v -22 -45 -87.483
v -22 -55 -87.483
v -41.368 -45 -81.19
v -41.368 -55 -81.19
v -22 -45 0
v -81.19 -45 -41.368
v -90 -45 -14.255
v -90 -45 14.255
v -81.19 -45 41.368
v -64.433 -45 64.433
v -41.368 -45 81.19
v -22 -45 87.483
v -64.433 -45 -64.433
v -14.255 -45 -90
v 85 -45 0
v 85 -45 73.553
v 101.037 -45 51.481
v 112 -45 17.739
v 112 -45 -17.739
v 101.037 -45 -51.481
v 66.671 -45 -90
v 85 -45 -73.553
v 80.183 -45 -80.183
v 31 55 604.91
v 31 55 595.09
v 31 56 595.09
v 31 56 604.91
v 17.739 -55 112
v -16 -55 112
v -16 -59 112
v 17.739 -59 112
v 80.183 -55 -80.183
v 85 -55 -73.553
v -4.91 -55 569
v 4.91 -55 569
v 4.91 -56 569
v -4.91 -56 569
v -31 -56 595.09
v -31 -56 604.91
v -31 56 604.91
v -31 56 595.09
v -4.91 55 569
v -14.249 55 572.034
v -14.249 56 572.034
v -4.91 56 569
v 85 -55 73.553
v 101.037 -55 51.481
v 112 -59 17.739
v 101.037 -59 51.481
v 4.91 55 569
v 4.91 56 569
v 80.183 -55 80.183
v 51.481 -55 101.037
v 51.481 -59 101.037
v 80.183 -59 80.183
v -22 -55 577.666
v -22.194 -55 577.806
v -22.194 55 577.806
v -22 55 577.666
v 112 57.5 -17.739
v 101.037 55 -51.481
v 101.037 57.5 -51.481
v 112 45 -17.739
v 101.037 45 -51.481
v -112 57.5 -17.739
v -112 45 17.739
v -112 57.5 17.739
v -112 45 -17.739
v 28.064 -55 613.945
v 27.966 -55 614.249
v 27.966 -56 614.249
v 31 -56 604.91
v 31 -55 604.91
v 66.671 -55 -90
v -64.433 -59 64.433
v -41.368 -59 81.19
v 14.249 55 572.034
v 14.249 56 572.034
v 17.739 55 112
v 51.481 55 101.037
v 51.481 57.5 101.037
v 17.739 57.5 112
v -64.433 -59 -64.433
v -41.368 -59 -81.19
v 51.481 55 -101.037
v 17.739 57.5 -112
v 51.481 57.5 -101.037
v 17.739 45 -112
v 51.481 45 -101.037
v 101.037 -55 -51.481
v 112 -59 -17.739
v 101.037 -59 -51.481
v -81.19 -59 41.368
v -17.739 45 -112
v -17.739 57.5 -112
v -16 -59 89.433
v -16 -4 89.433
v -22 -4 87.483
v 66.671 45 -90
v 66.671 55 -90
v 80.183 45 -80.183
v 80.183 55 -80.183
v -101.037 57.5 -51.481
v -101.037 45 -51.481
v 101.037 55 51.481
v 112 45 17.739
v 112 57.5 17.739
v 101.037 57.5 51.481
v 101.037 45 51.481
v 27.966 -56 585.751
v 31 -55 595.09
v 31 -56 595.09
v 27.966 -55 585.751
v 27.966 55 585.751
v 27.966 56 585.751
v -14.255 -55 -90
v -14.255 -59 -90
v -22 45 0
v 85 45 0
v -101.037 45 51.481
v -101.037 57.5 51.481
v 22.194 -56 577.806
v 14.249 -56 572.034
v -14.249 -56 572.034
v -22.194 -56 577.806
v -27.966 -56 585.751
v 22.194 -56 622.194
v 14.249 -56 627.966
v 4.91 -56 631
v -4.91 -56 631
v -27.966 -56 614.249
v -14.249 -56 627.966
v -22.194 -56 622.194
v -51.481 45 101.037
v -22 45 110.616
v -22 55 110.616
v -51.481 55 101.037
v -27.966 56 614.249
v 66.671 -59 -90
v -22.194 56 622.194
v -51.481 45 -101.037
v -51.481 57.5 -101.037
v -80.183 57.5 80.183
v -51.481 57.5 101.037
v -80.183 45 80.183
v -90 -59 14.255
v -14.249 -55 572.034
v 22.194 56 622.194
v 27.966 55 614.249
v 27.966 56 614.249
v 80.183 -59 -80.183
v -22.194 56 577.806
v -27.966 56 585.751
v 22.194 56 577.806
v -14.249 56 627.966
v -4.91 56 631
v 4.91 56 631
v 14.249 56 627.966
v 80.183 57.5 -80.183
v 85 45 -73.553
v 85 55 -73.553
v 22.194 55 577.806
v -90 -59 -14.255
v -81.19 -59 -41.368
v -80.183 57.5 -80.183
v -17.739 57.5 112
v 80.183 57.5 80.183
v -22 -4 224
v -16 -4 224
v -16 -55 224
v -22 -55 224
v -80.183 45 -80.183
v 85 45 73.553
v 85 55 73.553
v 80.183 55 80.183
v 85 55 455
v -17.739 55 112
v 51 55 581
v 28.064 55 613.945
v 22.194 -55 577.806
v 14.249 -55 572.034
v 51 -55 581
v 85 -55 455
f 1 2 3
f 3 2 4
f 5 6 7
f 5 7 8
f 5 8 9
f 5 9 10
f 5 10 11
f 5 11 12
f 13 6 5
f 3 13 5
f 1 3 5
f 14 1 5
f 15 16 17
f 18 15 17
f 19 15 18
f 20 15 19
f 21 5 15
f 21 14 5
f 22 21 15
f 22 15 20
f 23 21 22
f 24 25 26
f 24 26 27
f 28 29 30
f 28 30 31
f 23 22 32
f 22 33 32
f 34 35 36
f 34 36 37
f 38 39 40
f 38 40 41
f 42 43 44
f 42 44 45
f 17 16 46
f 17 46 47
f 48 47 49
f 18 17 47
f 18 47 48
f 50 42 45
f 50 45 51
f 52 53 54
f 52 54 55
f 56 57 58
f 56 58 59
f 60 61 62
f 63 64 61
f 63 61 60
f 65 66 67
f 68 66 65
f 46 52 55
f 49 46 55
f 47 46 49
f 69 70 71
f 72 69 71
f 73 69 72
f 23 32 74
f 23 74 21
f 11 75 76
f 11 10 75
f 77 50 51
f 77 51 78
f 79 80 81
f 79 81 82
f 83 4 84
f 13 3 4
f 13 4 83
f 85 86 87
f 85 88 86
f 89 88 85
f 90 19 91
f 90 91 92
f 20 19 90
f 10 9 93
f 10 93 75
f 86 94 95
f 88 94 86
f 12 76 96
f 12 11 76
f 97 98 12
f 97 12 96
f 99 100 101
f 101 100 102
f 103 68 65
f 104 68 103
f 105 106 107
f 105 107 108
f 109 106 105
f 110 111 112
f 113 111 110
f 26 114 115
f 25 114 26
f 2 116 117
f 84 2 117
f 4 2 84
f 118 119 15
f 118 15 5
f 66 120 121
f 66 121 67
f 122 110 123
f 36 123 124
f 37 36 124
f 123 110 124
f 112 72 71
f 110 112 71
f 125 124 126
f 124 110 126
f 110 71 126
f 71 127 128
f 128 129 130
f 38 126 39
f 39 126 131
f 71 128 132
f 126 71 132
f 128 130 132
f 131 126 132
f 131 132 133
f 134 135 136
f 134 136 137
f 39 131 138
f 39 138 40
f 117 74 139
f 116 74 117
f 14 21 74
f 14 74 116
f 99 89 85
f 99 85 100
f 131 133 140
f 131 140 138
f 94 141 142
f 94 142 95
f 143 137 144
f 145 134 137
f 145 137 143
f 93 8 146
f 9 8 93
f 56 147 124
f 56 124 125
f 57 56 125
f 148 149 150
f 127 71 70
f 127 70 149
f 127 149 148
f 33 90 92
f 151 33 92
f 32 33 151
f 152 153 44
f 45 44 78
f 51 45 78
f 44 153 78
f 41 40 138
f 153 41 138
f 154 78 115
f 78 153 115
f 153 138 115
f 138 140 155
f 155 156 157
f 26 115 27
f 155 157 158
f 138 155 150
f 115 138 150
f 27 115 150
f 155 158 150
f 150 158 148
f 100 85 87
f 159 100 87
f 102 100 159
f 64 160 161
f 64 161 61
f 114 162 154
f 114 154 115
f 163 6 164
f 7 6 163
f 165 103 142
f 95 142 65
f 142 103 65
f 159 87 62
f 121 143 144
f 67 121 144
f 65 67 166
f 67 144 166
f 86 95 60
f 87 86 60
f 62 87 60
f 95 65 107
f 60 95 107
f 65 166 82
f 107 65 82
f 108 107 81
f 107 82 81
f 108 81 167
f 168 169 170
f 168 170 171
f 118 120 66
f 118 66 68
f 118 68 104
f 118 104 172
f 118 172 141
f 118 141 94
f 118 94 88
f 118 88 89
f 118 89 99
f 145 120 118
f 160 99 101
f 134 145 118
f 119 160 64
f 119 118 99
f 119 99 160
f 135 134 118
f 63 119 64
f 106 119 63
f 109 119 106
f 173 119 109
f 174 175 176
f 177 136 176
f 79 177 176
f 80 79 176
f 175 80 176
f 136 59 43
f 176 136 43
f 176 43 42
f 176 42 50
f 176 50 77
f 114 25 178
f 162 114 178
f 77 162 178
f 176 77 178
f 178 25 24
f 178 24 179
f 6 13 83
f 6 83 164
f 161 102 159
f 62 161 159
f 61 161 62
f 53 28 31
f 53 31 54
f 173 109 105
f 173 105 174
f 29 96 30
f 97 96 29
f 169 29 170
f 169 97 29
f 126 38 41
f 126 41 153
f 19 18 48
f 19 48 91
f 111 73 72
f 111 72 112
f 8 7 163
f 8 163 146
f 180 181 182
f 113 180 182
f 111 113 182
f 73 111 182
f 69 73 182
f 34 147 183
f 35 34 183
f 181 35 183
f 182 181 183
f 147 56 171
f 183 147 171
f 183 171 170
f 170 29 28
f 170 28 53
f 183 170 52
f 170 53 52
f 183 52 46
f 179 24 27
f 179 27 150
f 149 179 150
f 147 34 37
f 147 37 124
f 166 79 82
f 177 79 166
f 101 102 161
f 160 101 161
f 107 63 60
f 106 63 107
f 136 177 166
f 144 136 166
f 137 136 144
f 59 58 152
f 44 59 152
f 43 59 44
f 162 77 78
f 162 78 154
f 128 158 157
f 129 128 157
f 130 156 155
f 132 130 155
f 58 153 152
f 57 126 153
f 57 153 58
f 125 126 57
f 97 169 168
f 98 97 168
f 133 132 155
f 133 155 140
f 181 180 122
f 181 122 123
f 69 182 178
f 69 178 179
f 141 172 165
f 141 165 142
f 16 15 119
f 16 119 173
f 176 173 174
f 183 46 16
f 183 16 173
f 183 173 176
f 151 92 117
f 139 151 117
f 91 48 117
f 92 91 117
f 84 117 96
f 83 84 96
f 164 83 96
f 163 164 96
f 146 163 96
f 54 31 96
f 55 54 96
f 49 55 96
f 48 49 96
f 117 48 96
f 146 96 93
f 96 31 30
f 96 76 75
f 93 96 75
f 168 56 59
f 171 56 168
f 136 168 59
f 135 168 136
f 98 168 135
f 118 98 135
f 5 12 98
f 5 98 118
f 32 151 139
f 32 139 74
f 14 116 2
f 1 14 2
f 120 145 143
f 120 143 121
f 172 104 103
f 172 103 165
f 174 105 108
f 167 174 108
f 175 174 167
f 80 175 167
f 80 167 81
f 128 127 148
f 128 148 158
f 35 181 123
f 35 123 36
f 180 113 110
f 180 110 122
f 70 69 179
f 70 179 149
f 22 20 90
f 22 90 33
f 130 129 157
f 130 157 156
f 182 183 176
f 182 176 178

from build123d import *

# Parameters (mm, degrees)
BOSS_EXTRUDE1_DEPTH = 10
BOSS_EXTRUDE2_DEPTH = 90
BOSS_EXTRUDE3_DEPTH = 10
CUT_EXTRUDE1_DEPTH  = 10
CUT_EXTRUDE2_DEPTH  = 90
CUT_EXTRUDE3_DEPTH  = 10
CUT_EXTRUDE4_DEPTH  = 10
CUT_EXTRUDE5_DEPTH  = 10
CUT_EXTRUDE6_DEPTH  = 9.81685291
SKETCH10_W          = 107
SKETCH10_H          = 90
CUT_EXTRUDE7_DEPTH  = 80.18314709
SKETCH11_W          = 6
SKETCH11_H          = 51
CUT_EXTRUDE8_DEPTH  = 134.567114958
BOSS_EXTRUDE4_DEPTH = 4
BOSS_EXTRUDE5_DEPTH = 1
BOSS_EXTRUDE6_DEPTH = 1
BOSS_EXTRUDE7_DEPTH = 2.5
DRAFT1_ANGLE        = 18
CHAMFER1_SIZE       = 6.379377731
CHAMFER1_SIZE2      = 12.134297522


with BuildPart() as part:
    # Sketch1 → Boss-Extrude1 (new body)
    with BuildSketch(Plane(origin=(0, -45, 0), x_dir=(1, 0, 0), z_dir=(0, 1, 0))):
        Polygon((101.03665965, 51.480749424), (85, 73.553317831), (85, 90), (66.671408228, 90), (51.480749424, 101.03665965), (17.739057316, 112), (-17.739057316, 112), (-51.480749424, 101.03665965), (-80.18314709, 80.18314709), (-101.03665965, 51.480749424), (-112, 17.739057316), (-112, -17.739057316), (-101.03665965, -51.480749424), (-80.18314709, -80.18314709), (-51.480749424, -101.03665965), (-22, -110.615535798), (-22, -577.665828314), (-22.193549641, -577.806450359), (-27.96550401, -585.750863999), (-31, -595.09008235), (-31, -604.90991765), (-27.96550401, -614.249136001), (-22.193549641, -622.193549641), (-14.249136001, -627.96550401), (-4.90991765, -631), (4.90991765, -631), (14.249136001, -627.96550401), (22.193549641, -622.193549641), (27.96550401, -614.249136001), (28.064334249, -613.944967802), (51, -581), (85, -455), (85, -73.553317831), (101.03665965, -51.480749424), (112, -17.739057316), (112, 17.739057316), align=None)
    extrude(amount=-BOSS_EXTRUDE1_DEPTH)

    # Sketch2 → Boss-Extrude2 (add)
    with BuildSketch(Plane(origin=(0, -45, 0), x_dir=(-1, 0, 0), z_dir=(0, 1, 0))):
        Polygon((-85, -90), (-85, 455), (-51, 581), (-28.064334249, 613.944967802), (-27.96550401, 614.249136001), (-22.193549641, 622.193549641), (-14.249136001, 627.96550401), (-4.90991765, 631), (4.90991765, 631), (14.249136001, 627.96550401), (22.193549641, 622.193549641), (27.96550401, 614.249136001), (31, 604.90991765), (31, 595.09008235), (27.96550401, 585.750863999), (22.193549641, 577.806450359), (22, 577.665828314), (22, 110.615535798), (51.480749424, 101.03665965), (80.18314709, 80.18314709), (101.03665965, 51.480749424), (112, 17.739057316), (112, -17.739057316), (101.03665965, -51.480749424), (80.18314709, -80.18314709), (51.480749424, -101.03665965), (17.739057316, -112), (-17.739057316, -112), (-51.480749424, -101.03665965), (-66.671408228, -90), align=None)
    extrude(amount=BOSS_EXTRUDE2_DEPTH)

    # Sketch3 → Boss-Extrude3 (add)
    with BuildSketch(Plane(origin=(0, 45, 0), x_dir=(-1, 0, 0), z_dir=(0, 1, 0))):
        Polygon((-85, -73.553317831), (-101.03665965, -51.480749424), (-112, -17.739057316), (-112, 17.739057316), (-101.03665965, 51.480749424), (-85, 73.553317831), (-85, 455), (-51, 581), (-28.064334249, 613.944967802), (-27.96550401, 614.249136001), (-22.193549641, 622.193549641), (-14.249136001, 627.96550401), (-4.90991765, 631), (4.90991765, 631), (14.249136001, 627.96550401), (22.193549641, 622.193549641), (27.96550401, 614.249136001), (31, 604.90991765), (31, 595.09008235), (27.96550401, 585.750863999), (22.193549641, 577.806450359), (22, 577.665828314), (22, 110.615535798), (51.480749424, 101.03665965), (80.18314709, 80.18314709), (101.03665965, 51.480749424), (112, 17.739057316), (112, -17.739057316), (101.03665965, -51.480749424), (80.18314709, -80.18314709), (51.480749424, -101.03665965), (17.739057316, -112), (-17.739057316, -112), (-51.480749424, -101.03665965), (-66.671408228, -90), (-85, -90), align=None)
    extrude(amount=BOSS_EXTRUDE3_DEPTH)

    # Sketch4 → Cut-Extrude1 (cut)
    with BuildSketch(Plane.XZ.offset(55)):
        Polygon((-30.023339436, 89.432885042), (-22, 89.432885042), (-22, 110.615535798), (-51.480749424, 101.03665965), (-80.18314709, 80.18314709), (-101.03665965, 51.480749424), (-112, 17.739057316), (-112, -17.739057316), (-101.03665965, -51.480749424), (-80.18314709, -80.18314709), (-51.480749424, -101.03665965), (-17.739057316, -112), (17.739057316, -112), (51.480749424, -101.03665965), (66.671408228, -90), (-22, -90), (-22, -87.483366864), (-41.368459358, -81.190172933), (-64.432886054, -64.432886054), (-81.190172933, -41.368459358), (-90, -14.254599629), (-90, 14.254599629), (-81.190172933, 41.368459358), (-64.432886054, 64.432886054), align=None)
    extrude(amount=-CUT_EXTRUDE1_DEPTH, mode=Mode.SUBTRACT)

    # Sketch5 → Cut-Extrude2 (cut)
    with BuildSketch(Plane.XZ.offset(45)):
        Polygon((66.671408228, -90), (-22, -90), (-22, 110.615535798), (-51.480749424, 101.03665965), (-80.18314709, 80.18314709), (-101.03665965, 51.480749424), (-112, 17.739057316), (-112, -17.739057316), (-101.03665965, -51.480749424), (-80.18314709, -80.18314709), (-51.480749424, -101.03665965), (-17.739057316, -112), (17.739057316, -112), (51.480749424, -101.03665965), align=None)
    extrude(amount=-CUT_EXTRUDE2_DEPTH, mode=Mode.SUBTRACT)

    # Sketch6 → Cut-Extrude3 (cut)
    with BuildSketch(Plane.XZ.offset(55)):
        Polygon((85, -90), (85, -73.553317831), (73.050785959, -90), align=None)
    extrude(amount=-CUT_EXTRUDE3_DEPTH, mode=Mode.SUBTRACT)

    # Sketch7 → Cut-Extrude4 (cut)
    with BuildSketch(Plane.XZ.offset(55)):
        Polygon((-14.254599629, -90), (-22, -87.483366864), (-22, -90), align=None)
    extrude(amount=-CUT_EXTRUDE4_DEPTH, mode=Mode.SUBTRACT)

    # Sketch8 → Cut-Extrude5 (cut)
    with BuildSketch(Plane(origin=(0, 55, 0), x_dir=(-1, 0, 0), z_dir=(0, 1, 0))):
        Polygon((-80.18314709, -80.18314709), (-85, -73.553317831), (-85, -90), (-66.671408228, -90), align=None)
    extrude(amount=-CUT_EXTRUDE5_DEPTH, mode=Mode.SUBTRACT)

    # Sketch9 → Cut-Extrude6 (cut)
    with BuildSketch(Plane(origin=(0, 0, -90), x_dir=(-1, 0, 0), z_dir=(0, 0, -1))):
        Polygon((-80.18314709, -45), (22, -45), (22, 45), (-80.18314709, 45), (-85, 45), (-85, -45), align=None)
    extrude(amount=-CUT_EXTRUDE6_DEPTH, mode=Mode.SUBTRACT)

    # Sketch10 → Cut-Extrude7 (cut)
    with BuildSketch(Plane(origin=(0, 0, -80.18314709), x_dir=(-1, 0, 0), z_dir=(0, 0, -1))):
        with Locations((-31.5, 0)):
            Rectangle(SKETCH10_W, SKETCH10_H)
    extrude(amount=-CUT_EXTRUDE7_DEPTH, mode=Mode.SUBTRACT)

    # Sketch11 → Cut-Extrude8 (cut)
    with BuildSketch(Plane(origin=(0, 0, 89.432885042), x_dir=(-1, 0, 0), z_dir=(0, 0, -1))):
        with Locations((19, -29.5)):
            Rectangle(SKETCH11_W, SKETCH11_H)
    extrude(amount=-CUT_EXTRUDE8_DEPTH, mode=Mode.SUBTRACT)

    # Sketch12 → Boss-Extrude4 (add)
    with BuildSketch(Plane.XZ.offset(55)):
        Polygon((-16, 89.432885042), (-16, 112), (17.739057316, 112), (51.480749424, 101.03665965), (80.18314709, 80.18314709), (101.03665965, 51.480749424), (112, 17.739057316), (112, -17.739057316), (101.03665965, -51.480749424), (73.050785959, -90), (-14.254599629, -90), (-41.368459358, -81.190172933), (-64.432886054, -64.432886054), (-81.190172933, -41.368459358), (-90, -14.254599629), (-90, 14.254599629), (-81.190172933, 41.368459358), (-64.432886054, 64.432886054), (-30.023339436, 89.432885042), align=None)
    extrude(amount=BOSS_EXTRUDE4_DEPTH)

    # Sketch13 → Boss-Extrude5 (add)
    with BuildSketch(Plane.XZ.offset(55)):
        Polygon((22.193549641, 577.806450359), (14.249136001, 572.03449599), (4.90991765, 569), (-4.90991765, 569), (-14.249136001, 572.03449599), (-22.193549641, 577.806450359), (-27.96550401, 585.750863999), (-31, 595.09008235), (-31, 604.90991765), (-27.96550401, 614.249136001), (-22.193549641, 622.193549641), (-14.249136001, 627.96550401), (-4.90991765, 631), (4.90991765, 631), (14.249136001, 627.96550401), (22.193549641, 622.193549641), (27.96550401, 614.249136001), (31, 604.90991765), (31, 595.09008235), (27.96550401, 585.750863999), align=None)
    extrude(amount=BOSS_EXTRUDE5_DEPTH)

    # Sketch14 → Boss-Extrude6 (add)
    with BuildSketch(Plane(origin=(0, 55, 0), x_dir=(-1, 0, 0), z_dir=(0, 1, 0))):
        Polygon((-14.249136001, 572.03449599), (-22.193549641, 577.806450359), (-27.96550401, 585.750863999), (-31, 595.09008235), (-31, 604.90991765), (-27.96550401, 614.249136001), (-22.193549641, 622.193549641), (-14.249136001, 627.96550401), (-4.90991765, 631), (4.90991765, 631), (14.249136001, 627.96550401), (22.193549641, 622.193549641), (27.96550401, 614.249136001), (31, 604.90991765), (31, 595.09008235), (27.96550401, 585.750863999), (22.193549641, 577.806450359), (14.249136001, 572.03449599), (4.90991765, 569), (-4.90991765, 569), align=None)
    extrude(amount=BOSS_EXTRUDE6_DEPTH)

    # Sketch15 → Boss-Extrude7 (add)
    with BuildSketch(Plane(origin=(0, 55, 0), x_dir=(-1, 0, 0), z_dir=(0, 1, 0))):
        Polygon((-80.18314709, -80.18314709), (-101.03665965, -51.480749424), (-112, -17.739057316), (-112, 17.739057316), (-101.03665965, 51.480749424), (-80.18314709, 80.18314709), (-51.480749424, 101.03665965), (-17.739057316, 112), (17.739057316, 112), (51.480749424, 101.03665965), (80.18314709, 80.18314709), (101.03665965, 51.480749424), (112, 17.739057316), (112, -17.739057316), (101.03665965, -51.480749424), (80.18314709, -80.18314709), (51.480749424, -101.03665965), (17.739057316, -112), (-17.739057316, -112), (-51.480749424, -101.03665965), align=None)
    extrude(amount=BOSS_EXTRUDE7_DEPTH)

    # Draft1
    draft1_faces = [part.faces().sort_by_distance(p)[0] for p in [
        (-20.780579815, -36.705876441, 89.432885042),
    ]]
    draft(draft1_faces, Plane(origin=(-16, -4, 224), x_dir=(0, 0, -1), z_dir=(-1, 0, 0)), DRAFT1_ANGLE)

    # Chamfer1
    chamfer1_edges = [part.edges().sort_by_distance(p)[0] for p in [
        (73.050785959, -52, -90),
    ]]
    chamfer1_side = [part.faces().sort_by_distance(p)[0] for p in [
        (29.398093165, -52, -90),
    ]]
    chamfer(chamfer1_edges, length=CHAMFER1_SIZE, length2=CHAMFER1_SIZE2, reference=chamfer1_side[0])


solid = part.part
